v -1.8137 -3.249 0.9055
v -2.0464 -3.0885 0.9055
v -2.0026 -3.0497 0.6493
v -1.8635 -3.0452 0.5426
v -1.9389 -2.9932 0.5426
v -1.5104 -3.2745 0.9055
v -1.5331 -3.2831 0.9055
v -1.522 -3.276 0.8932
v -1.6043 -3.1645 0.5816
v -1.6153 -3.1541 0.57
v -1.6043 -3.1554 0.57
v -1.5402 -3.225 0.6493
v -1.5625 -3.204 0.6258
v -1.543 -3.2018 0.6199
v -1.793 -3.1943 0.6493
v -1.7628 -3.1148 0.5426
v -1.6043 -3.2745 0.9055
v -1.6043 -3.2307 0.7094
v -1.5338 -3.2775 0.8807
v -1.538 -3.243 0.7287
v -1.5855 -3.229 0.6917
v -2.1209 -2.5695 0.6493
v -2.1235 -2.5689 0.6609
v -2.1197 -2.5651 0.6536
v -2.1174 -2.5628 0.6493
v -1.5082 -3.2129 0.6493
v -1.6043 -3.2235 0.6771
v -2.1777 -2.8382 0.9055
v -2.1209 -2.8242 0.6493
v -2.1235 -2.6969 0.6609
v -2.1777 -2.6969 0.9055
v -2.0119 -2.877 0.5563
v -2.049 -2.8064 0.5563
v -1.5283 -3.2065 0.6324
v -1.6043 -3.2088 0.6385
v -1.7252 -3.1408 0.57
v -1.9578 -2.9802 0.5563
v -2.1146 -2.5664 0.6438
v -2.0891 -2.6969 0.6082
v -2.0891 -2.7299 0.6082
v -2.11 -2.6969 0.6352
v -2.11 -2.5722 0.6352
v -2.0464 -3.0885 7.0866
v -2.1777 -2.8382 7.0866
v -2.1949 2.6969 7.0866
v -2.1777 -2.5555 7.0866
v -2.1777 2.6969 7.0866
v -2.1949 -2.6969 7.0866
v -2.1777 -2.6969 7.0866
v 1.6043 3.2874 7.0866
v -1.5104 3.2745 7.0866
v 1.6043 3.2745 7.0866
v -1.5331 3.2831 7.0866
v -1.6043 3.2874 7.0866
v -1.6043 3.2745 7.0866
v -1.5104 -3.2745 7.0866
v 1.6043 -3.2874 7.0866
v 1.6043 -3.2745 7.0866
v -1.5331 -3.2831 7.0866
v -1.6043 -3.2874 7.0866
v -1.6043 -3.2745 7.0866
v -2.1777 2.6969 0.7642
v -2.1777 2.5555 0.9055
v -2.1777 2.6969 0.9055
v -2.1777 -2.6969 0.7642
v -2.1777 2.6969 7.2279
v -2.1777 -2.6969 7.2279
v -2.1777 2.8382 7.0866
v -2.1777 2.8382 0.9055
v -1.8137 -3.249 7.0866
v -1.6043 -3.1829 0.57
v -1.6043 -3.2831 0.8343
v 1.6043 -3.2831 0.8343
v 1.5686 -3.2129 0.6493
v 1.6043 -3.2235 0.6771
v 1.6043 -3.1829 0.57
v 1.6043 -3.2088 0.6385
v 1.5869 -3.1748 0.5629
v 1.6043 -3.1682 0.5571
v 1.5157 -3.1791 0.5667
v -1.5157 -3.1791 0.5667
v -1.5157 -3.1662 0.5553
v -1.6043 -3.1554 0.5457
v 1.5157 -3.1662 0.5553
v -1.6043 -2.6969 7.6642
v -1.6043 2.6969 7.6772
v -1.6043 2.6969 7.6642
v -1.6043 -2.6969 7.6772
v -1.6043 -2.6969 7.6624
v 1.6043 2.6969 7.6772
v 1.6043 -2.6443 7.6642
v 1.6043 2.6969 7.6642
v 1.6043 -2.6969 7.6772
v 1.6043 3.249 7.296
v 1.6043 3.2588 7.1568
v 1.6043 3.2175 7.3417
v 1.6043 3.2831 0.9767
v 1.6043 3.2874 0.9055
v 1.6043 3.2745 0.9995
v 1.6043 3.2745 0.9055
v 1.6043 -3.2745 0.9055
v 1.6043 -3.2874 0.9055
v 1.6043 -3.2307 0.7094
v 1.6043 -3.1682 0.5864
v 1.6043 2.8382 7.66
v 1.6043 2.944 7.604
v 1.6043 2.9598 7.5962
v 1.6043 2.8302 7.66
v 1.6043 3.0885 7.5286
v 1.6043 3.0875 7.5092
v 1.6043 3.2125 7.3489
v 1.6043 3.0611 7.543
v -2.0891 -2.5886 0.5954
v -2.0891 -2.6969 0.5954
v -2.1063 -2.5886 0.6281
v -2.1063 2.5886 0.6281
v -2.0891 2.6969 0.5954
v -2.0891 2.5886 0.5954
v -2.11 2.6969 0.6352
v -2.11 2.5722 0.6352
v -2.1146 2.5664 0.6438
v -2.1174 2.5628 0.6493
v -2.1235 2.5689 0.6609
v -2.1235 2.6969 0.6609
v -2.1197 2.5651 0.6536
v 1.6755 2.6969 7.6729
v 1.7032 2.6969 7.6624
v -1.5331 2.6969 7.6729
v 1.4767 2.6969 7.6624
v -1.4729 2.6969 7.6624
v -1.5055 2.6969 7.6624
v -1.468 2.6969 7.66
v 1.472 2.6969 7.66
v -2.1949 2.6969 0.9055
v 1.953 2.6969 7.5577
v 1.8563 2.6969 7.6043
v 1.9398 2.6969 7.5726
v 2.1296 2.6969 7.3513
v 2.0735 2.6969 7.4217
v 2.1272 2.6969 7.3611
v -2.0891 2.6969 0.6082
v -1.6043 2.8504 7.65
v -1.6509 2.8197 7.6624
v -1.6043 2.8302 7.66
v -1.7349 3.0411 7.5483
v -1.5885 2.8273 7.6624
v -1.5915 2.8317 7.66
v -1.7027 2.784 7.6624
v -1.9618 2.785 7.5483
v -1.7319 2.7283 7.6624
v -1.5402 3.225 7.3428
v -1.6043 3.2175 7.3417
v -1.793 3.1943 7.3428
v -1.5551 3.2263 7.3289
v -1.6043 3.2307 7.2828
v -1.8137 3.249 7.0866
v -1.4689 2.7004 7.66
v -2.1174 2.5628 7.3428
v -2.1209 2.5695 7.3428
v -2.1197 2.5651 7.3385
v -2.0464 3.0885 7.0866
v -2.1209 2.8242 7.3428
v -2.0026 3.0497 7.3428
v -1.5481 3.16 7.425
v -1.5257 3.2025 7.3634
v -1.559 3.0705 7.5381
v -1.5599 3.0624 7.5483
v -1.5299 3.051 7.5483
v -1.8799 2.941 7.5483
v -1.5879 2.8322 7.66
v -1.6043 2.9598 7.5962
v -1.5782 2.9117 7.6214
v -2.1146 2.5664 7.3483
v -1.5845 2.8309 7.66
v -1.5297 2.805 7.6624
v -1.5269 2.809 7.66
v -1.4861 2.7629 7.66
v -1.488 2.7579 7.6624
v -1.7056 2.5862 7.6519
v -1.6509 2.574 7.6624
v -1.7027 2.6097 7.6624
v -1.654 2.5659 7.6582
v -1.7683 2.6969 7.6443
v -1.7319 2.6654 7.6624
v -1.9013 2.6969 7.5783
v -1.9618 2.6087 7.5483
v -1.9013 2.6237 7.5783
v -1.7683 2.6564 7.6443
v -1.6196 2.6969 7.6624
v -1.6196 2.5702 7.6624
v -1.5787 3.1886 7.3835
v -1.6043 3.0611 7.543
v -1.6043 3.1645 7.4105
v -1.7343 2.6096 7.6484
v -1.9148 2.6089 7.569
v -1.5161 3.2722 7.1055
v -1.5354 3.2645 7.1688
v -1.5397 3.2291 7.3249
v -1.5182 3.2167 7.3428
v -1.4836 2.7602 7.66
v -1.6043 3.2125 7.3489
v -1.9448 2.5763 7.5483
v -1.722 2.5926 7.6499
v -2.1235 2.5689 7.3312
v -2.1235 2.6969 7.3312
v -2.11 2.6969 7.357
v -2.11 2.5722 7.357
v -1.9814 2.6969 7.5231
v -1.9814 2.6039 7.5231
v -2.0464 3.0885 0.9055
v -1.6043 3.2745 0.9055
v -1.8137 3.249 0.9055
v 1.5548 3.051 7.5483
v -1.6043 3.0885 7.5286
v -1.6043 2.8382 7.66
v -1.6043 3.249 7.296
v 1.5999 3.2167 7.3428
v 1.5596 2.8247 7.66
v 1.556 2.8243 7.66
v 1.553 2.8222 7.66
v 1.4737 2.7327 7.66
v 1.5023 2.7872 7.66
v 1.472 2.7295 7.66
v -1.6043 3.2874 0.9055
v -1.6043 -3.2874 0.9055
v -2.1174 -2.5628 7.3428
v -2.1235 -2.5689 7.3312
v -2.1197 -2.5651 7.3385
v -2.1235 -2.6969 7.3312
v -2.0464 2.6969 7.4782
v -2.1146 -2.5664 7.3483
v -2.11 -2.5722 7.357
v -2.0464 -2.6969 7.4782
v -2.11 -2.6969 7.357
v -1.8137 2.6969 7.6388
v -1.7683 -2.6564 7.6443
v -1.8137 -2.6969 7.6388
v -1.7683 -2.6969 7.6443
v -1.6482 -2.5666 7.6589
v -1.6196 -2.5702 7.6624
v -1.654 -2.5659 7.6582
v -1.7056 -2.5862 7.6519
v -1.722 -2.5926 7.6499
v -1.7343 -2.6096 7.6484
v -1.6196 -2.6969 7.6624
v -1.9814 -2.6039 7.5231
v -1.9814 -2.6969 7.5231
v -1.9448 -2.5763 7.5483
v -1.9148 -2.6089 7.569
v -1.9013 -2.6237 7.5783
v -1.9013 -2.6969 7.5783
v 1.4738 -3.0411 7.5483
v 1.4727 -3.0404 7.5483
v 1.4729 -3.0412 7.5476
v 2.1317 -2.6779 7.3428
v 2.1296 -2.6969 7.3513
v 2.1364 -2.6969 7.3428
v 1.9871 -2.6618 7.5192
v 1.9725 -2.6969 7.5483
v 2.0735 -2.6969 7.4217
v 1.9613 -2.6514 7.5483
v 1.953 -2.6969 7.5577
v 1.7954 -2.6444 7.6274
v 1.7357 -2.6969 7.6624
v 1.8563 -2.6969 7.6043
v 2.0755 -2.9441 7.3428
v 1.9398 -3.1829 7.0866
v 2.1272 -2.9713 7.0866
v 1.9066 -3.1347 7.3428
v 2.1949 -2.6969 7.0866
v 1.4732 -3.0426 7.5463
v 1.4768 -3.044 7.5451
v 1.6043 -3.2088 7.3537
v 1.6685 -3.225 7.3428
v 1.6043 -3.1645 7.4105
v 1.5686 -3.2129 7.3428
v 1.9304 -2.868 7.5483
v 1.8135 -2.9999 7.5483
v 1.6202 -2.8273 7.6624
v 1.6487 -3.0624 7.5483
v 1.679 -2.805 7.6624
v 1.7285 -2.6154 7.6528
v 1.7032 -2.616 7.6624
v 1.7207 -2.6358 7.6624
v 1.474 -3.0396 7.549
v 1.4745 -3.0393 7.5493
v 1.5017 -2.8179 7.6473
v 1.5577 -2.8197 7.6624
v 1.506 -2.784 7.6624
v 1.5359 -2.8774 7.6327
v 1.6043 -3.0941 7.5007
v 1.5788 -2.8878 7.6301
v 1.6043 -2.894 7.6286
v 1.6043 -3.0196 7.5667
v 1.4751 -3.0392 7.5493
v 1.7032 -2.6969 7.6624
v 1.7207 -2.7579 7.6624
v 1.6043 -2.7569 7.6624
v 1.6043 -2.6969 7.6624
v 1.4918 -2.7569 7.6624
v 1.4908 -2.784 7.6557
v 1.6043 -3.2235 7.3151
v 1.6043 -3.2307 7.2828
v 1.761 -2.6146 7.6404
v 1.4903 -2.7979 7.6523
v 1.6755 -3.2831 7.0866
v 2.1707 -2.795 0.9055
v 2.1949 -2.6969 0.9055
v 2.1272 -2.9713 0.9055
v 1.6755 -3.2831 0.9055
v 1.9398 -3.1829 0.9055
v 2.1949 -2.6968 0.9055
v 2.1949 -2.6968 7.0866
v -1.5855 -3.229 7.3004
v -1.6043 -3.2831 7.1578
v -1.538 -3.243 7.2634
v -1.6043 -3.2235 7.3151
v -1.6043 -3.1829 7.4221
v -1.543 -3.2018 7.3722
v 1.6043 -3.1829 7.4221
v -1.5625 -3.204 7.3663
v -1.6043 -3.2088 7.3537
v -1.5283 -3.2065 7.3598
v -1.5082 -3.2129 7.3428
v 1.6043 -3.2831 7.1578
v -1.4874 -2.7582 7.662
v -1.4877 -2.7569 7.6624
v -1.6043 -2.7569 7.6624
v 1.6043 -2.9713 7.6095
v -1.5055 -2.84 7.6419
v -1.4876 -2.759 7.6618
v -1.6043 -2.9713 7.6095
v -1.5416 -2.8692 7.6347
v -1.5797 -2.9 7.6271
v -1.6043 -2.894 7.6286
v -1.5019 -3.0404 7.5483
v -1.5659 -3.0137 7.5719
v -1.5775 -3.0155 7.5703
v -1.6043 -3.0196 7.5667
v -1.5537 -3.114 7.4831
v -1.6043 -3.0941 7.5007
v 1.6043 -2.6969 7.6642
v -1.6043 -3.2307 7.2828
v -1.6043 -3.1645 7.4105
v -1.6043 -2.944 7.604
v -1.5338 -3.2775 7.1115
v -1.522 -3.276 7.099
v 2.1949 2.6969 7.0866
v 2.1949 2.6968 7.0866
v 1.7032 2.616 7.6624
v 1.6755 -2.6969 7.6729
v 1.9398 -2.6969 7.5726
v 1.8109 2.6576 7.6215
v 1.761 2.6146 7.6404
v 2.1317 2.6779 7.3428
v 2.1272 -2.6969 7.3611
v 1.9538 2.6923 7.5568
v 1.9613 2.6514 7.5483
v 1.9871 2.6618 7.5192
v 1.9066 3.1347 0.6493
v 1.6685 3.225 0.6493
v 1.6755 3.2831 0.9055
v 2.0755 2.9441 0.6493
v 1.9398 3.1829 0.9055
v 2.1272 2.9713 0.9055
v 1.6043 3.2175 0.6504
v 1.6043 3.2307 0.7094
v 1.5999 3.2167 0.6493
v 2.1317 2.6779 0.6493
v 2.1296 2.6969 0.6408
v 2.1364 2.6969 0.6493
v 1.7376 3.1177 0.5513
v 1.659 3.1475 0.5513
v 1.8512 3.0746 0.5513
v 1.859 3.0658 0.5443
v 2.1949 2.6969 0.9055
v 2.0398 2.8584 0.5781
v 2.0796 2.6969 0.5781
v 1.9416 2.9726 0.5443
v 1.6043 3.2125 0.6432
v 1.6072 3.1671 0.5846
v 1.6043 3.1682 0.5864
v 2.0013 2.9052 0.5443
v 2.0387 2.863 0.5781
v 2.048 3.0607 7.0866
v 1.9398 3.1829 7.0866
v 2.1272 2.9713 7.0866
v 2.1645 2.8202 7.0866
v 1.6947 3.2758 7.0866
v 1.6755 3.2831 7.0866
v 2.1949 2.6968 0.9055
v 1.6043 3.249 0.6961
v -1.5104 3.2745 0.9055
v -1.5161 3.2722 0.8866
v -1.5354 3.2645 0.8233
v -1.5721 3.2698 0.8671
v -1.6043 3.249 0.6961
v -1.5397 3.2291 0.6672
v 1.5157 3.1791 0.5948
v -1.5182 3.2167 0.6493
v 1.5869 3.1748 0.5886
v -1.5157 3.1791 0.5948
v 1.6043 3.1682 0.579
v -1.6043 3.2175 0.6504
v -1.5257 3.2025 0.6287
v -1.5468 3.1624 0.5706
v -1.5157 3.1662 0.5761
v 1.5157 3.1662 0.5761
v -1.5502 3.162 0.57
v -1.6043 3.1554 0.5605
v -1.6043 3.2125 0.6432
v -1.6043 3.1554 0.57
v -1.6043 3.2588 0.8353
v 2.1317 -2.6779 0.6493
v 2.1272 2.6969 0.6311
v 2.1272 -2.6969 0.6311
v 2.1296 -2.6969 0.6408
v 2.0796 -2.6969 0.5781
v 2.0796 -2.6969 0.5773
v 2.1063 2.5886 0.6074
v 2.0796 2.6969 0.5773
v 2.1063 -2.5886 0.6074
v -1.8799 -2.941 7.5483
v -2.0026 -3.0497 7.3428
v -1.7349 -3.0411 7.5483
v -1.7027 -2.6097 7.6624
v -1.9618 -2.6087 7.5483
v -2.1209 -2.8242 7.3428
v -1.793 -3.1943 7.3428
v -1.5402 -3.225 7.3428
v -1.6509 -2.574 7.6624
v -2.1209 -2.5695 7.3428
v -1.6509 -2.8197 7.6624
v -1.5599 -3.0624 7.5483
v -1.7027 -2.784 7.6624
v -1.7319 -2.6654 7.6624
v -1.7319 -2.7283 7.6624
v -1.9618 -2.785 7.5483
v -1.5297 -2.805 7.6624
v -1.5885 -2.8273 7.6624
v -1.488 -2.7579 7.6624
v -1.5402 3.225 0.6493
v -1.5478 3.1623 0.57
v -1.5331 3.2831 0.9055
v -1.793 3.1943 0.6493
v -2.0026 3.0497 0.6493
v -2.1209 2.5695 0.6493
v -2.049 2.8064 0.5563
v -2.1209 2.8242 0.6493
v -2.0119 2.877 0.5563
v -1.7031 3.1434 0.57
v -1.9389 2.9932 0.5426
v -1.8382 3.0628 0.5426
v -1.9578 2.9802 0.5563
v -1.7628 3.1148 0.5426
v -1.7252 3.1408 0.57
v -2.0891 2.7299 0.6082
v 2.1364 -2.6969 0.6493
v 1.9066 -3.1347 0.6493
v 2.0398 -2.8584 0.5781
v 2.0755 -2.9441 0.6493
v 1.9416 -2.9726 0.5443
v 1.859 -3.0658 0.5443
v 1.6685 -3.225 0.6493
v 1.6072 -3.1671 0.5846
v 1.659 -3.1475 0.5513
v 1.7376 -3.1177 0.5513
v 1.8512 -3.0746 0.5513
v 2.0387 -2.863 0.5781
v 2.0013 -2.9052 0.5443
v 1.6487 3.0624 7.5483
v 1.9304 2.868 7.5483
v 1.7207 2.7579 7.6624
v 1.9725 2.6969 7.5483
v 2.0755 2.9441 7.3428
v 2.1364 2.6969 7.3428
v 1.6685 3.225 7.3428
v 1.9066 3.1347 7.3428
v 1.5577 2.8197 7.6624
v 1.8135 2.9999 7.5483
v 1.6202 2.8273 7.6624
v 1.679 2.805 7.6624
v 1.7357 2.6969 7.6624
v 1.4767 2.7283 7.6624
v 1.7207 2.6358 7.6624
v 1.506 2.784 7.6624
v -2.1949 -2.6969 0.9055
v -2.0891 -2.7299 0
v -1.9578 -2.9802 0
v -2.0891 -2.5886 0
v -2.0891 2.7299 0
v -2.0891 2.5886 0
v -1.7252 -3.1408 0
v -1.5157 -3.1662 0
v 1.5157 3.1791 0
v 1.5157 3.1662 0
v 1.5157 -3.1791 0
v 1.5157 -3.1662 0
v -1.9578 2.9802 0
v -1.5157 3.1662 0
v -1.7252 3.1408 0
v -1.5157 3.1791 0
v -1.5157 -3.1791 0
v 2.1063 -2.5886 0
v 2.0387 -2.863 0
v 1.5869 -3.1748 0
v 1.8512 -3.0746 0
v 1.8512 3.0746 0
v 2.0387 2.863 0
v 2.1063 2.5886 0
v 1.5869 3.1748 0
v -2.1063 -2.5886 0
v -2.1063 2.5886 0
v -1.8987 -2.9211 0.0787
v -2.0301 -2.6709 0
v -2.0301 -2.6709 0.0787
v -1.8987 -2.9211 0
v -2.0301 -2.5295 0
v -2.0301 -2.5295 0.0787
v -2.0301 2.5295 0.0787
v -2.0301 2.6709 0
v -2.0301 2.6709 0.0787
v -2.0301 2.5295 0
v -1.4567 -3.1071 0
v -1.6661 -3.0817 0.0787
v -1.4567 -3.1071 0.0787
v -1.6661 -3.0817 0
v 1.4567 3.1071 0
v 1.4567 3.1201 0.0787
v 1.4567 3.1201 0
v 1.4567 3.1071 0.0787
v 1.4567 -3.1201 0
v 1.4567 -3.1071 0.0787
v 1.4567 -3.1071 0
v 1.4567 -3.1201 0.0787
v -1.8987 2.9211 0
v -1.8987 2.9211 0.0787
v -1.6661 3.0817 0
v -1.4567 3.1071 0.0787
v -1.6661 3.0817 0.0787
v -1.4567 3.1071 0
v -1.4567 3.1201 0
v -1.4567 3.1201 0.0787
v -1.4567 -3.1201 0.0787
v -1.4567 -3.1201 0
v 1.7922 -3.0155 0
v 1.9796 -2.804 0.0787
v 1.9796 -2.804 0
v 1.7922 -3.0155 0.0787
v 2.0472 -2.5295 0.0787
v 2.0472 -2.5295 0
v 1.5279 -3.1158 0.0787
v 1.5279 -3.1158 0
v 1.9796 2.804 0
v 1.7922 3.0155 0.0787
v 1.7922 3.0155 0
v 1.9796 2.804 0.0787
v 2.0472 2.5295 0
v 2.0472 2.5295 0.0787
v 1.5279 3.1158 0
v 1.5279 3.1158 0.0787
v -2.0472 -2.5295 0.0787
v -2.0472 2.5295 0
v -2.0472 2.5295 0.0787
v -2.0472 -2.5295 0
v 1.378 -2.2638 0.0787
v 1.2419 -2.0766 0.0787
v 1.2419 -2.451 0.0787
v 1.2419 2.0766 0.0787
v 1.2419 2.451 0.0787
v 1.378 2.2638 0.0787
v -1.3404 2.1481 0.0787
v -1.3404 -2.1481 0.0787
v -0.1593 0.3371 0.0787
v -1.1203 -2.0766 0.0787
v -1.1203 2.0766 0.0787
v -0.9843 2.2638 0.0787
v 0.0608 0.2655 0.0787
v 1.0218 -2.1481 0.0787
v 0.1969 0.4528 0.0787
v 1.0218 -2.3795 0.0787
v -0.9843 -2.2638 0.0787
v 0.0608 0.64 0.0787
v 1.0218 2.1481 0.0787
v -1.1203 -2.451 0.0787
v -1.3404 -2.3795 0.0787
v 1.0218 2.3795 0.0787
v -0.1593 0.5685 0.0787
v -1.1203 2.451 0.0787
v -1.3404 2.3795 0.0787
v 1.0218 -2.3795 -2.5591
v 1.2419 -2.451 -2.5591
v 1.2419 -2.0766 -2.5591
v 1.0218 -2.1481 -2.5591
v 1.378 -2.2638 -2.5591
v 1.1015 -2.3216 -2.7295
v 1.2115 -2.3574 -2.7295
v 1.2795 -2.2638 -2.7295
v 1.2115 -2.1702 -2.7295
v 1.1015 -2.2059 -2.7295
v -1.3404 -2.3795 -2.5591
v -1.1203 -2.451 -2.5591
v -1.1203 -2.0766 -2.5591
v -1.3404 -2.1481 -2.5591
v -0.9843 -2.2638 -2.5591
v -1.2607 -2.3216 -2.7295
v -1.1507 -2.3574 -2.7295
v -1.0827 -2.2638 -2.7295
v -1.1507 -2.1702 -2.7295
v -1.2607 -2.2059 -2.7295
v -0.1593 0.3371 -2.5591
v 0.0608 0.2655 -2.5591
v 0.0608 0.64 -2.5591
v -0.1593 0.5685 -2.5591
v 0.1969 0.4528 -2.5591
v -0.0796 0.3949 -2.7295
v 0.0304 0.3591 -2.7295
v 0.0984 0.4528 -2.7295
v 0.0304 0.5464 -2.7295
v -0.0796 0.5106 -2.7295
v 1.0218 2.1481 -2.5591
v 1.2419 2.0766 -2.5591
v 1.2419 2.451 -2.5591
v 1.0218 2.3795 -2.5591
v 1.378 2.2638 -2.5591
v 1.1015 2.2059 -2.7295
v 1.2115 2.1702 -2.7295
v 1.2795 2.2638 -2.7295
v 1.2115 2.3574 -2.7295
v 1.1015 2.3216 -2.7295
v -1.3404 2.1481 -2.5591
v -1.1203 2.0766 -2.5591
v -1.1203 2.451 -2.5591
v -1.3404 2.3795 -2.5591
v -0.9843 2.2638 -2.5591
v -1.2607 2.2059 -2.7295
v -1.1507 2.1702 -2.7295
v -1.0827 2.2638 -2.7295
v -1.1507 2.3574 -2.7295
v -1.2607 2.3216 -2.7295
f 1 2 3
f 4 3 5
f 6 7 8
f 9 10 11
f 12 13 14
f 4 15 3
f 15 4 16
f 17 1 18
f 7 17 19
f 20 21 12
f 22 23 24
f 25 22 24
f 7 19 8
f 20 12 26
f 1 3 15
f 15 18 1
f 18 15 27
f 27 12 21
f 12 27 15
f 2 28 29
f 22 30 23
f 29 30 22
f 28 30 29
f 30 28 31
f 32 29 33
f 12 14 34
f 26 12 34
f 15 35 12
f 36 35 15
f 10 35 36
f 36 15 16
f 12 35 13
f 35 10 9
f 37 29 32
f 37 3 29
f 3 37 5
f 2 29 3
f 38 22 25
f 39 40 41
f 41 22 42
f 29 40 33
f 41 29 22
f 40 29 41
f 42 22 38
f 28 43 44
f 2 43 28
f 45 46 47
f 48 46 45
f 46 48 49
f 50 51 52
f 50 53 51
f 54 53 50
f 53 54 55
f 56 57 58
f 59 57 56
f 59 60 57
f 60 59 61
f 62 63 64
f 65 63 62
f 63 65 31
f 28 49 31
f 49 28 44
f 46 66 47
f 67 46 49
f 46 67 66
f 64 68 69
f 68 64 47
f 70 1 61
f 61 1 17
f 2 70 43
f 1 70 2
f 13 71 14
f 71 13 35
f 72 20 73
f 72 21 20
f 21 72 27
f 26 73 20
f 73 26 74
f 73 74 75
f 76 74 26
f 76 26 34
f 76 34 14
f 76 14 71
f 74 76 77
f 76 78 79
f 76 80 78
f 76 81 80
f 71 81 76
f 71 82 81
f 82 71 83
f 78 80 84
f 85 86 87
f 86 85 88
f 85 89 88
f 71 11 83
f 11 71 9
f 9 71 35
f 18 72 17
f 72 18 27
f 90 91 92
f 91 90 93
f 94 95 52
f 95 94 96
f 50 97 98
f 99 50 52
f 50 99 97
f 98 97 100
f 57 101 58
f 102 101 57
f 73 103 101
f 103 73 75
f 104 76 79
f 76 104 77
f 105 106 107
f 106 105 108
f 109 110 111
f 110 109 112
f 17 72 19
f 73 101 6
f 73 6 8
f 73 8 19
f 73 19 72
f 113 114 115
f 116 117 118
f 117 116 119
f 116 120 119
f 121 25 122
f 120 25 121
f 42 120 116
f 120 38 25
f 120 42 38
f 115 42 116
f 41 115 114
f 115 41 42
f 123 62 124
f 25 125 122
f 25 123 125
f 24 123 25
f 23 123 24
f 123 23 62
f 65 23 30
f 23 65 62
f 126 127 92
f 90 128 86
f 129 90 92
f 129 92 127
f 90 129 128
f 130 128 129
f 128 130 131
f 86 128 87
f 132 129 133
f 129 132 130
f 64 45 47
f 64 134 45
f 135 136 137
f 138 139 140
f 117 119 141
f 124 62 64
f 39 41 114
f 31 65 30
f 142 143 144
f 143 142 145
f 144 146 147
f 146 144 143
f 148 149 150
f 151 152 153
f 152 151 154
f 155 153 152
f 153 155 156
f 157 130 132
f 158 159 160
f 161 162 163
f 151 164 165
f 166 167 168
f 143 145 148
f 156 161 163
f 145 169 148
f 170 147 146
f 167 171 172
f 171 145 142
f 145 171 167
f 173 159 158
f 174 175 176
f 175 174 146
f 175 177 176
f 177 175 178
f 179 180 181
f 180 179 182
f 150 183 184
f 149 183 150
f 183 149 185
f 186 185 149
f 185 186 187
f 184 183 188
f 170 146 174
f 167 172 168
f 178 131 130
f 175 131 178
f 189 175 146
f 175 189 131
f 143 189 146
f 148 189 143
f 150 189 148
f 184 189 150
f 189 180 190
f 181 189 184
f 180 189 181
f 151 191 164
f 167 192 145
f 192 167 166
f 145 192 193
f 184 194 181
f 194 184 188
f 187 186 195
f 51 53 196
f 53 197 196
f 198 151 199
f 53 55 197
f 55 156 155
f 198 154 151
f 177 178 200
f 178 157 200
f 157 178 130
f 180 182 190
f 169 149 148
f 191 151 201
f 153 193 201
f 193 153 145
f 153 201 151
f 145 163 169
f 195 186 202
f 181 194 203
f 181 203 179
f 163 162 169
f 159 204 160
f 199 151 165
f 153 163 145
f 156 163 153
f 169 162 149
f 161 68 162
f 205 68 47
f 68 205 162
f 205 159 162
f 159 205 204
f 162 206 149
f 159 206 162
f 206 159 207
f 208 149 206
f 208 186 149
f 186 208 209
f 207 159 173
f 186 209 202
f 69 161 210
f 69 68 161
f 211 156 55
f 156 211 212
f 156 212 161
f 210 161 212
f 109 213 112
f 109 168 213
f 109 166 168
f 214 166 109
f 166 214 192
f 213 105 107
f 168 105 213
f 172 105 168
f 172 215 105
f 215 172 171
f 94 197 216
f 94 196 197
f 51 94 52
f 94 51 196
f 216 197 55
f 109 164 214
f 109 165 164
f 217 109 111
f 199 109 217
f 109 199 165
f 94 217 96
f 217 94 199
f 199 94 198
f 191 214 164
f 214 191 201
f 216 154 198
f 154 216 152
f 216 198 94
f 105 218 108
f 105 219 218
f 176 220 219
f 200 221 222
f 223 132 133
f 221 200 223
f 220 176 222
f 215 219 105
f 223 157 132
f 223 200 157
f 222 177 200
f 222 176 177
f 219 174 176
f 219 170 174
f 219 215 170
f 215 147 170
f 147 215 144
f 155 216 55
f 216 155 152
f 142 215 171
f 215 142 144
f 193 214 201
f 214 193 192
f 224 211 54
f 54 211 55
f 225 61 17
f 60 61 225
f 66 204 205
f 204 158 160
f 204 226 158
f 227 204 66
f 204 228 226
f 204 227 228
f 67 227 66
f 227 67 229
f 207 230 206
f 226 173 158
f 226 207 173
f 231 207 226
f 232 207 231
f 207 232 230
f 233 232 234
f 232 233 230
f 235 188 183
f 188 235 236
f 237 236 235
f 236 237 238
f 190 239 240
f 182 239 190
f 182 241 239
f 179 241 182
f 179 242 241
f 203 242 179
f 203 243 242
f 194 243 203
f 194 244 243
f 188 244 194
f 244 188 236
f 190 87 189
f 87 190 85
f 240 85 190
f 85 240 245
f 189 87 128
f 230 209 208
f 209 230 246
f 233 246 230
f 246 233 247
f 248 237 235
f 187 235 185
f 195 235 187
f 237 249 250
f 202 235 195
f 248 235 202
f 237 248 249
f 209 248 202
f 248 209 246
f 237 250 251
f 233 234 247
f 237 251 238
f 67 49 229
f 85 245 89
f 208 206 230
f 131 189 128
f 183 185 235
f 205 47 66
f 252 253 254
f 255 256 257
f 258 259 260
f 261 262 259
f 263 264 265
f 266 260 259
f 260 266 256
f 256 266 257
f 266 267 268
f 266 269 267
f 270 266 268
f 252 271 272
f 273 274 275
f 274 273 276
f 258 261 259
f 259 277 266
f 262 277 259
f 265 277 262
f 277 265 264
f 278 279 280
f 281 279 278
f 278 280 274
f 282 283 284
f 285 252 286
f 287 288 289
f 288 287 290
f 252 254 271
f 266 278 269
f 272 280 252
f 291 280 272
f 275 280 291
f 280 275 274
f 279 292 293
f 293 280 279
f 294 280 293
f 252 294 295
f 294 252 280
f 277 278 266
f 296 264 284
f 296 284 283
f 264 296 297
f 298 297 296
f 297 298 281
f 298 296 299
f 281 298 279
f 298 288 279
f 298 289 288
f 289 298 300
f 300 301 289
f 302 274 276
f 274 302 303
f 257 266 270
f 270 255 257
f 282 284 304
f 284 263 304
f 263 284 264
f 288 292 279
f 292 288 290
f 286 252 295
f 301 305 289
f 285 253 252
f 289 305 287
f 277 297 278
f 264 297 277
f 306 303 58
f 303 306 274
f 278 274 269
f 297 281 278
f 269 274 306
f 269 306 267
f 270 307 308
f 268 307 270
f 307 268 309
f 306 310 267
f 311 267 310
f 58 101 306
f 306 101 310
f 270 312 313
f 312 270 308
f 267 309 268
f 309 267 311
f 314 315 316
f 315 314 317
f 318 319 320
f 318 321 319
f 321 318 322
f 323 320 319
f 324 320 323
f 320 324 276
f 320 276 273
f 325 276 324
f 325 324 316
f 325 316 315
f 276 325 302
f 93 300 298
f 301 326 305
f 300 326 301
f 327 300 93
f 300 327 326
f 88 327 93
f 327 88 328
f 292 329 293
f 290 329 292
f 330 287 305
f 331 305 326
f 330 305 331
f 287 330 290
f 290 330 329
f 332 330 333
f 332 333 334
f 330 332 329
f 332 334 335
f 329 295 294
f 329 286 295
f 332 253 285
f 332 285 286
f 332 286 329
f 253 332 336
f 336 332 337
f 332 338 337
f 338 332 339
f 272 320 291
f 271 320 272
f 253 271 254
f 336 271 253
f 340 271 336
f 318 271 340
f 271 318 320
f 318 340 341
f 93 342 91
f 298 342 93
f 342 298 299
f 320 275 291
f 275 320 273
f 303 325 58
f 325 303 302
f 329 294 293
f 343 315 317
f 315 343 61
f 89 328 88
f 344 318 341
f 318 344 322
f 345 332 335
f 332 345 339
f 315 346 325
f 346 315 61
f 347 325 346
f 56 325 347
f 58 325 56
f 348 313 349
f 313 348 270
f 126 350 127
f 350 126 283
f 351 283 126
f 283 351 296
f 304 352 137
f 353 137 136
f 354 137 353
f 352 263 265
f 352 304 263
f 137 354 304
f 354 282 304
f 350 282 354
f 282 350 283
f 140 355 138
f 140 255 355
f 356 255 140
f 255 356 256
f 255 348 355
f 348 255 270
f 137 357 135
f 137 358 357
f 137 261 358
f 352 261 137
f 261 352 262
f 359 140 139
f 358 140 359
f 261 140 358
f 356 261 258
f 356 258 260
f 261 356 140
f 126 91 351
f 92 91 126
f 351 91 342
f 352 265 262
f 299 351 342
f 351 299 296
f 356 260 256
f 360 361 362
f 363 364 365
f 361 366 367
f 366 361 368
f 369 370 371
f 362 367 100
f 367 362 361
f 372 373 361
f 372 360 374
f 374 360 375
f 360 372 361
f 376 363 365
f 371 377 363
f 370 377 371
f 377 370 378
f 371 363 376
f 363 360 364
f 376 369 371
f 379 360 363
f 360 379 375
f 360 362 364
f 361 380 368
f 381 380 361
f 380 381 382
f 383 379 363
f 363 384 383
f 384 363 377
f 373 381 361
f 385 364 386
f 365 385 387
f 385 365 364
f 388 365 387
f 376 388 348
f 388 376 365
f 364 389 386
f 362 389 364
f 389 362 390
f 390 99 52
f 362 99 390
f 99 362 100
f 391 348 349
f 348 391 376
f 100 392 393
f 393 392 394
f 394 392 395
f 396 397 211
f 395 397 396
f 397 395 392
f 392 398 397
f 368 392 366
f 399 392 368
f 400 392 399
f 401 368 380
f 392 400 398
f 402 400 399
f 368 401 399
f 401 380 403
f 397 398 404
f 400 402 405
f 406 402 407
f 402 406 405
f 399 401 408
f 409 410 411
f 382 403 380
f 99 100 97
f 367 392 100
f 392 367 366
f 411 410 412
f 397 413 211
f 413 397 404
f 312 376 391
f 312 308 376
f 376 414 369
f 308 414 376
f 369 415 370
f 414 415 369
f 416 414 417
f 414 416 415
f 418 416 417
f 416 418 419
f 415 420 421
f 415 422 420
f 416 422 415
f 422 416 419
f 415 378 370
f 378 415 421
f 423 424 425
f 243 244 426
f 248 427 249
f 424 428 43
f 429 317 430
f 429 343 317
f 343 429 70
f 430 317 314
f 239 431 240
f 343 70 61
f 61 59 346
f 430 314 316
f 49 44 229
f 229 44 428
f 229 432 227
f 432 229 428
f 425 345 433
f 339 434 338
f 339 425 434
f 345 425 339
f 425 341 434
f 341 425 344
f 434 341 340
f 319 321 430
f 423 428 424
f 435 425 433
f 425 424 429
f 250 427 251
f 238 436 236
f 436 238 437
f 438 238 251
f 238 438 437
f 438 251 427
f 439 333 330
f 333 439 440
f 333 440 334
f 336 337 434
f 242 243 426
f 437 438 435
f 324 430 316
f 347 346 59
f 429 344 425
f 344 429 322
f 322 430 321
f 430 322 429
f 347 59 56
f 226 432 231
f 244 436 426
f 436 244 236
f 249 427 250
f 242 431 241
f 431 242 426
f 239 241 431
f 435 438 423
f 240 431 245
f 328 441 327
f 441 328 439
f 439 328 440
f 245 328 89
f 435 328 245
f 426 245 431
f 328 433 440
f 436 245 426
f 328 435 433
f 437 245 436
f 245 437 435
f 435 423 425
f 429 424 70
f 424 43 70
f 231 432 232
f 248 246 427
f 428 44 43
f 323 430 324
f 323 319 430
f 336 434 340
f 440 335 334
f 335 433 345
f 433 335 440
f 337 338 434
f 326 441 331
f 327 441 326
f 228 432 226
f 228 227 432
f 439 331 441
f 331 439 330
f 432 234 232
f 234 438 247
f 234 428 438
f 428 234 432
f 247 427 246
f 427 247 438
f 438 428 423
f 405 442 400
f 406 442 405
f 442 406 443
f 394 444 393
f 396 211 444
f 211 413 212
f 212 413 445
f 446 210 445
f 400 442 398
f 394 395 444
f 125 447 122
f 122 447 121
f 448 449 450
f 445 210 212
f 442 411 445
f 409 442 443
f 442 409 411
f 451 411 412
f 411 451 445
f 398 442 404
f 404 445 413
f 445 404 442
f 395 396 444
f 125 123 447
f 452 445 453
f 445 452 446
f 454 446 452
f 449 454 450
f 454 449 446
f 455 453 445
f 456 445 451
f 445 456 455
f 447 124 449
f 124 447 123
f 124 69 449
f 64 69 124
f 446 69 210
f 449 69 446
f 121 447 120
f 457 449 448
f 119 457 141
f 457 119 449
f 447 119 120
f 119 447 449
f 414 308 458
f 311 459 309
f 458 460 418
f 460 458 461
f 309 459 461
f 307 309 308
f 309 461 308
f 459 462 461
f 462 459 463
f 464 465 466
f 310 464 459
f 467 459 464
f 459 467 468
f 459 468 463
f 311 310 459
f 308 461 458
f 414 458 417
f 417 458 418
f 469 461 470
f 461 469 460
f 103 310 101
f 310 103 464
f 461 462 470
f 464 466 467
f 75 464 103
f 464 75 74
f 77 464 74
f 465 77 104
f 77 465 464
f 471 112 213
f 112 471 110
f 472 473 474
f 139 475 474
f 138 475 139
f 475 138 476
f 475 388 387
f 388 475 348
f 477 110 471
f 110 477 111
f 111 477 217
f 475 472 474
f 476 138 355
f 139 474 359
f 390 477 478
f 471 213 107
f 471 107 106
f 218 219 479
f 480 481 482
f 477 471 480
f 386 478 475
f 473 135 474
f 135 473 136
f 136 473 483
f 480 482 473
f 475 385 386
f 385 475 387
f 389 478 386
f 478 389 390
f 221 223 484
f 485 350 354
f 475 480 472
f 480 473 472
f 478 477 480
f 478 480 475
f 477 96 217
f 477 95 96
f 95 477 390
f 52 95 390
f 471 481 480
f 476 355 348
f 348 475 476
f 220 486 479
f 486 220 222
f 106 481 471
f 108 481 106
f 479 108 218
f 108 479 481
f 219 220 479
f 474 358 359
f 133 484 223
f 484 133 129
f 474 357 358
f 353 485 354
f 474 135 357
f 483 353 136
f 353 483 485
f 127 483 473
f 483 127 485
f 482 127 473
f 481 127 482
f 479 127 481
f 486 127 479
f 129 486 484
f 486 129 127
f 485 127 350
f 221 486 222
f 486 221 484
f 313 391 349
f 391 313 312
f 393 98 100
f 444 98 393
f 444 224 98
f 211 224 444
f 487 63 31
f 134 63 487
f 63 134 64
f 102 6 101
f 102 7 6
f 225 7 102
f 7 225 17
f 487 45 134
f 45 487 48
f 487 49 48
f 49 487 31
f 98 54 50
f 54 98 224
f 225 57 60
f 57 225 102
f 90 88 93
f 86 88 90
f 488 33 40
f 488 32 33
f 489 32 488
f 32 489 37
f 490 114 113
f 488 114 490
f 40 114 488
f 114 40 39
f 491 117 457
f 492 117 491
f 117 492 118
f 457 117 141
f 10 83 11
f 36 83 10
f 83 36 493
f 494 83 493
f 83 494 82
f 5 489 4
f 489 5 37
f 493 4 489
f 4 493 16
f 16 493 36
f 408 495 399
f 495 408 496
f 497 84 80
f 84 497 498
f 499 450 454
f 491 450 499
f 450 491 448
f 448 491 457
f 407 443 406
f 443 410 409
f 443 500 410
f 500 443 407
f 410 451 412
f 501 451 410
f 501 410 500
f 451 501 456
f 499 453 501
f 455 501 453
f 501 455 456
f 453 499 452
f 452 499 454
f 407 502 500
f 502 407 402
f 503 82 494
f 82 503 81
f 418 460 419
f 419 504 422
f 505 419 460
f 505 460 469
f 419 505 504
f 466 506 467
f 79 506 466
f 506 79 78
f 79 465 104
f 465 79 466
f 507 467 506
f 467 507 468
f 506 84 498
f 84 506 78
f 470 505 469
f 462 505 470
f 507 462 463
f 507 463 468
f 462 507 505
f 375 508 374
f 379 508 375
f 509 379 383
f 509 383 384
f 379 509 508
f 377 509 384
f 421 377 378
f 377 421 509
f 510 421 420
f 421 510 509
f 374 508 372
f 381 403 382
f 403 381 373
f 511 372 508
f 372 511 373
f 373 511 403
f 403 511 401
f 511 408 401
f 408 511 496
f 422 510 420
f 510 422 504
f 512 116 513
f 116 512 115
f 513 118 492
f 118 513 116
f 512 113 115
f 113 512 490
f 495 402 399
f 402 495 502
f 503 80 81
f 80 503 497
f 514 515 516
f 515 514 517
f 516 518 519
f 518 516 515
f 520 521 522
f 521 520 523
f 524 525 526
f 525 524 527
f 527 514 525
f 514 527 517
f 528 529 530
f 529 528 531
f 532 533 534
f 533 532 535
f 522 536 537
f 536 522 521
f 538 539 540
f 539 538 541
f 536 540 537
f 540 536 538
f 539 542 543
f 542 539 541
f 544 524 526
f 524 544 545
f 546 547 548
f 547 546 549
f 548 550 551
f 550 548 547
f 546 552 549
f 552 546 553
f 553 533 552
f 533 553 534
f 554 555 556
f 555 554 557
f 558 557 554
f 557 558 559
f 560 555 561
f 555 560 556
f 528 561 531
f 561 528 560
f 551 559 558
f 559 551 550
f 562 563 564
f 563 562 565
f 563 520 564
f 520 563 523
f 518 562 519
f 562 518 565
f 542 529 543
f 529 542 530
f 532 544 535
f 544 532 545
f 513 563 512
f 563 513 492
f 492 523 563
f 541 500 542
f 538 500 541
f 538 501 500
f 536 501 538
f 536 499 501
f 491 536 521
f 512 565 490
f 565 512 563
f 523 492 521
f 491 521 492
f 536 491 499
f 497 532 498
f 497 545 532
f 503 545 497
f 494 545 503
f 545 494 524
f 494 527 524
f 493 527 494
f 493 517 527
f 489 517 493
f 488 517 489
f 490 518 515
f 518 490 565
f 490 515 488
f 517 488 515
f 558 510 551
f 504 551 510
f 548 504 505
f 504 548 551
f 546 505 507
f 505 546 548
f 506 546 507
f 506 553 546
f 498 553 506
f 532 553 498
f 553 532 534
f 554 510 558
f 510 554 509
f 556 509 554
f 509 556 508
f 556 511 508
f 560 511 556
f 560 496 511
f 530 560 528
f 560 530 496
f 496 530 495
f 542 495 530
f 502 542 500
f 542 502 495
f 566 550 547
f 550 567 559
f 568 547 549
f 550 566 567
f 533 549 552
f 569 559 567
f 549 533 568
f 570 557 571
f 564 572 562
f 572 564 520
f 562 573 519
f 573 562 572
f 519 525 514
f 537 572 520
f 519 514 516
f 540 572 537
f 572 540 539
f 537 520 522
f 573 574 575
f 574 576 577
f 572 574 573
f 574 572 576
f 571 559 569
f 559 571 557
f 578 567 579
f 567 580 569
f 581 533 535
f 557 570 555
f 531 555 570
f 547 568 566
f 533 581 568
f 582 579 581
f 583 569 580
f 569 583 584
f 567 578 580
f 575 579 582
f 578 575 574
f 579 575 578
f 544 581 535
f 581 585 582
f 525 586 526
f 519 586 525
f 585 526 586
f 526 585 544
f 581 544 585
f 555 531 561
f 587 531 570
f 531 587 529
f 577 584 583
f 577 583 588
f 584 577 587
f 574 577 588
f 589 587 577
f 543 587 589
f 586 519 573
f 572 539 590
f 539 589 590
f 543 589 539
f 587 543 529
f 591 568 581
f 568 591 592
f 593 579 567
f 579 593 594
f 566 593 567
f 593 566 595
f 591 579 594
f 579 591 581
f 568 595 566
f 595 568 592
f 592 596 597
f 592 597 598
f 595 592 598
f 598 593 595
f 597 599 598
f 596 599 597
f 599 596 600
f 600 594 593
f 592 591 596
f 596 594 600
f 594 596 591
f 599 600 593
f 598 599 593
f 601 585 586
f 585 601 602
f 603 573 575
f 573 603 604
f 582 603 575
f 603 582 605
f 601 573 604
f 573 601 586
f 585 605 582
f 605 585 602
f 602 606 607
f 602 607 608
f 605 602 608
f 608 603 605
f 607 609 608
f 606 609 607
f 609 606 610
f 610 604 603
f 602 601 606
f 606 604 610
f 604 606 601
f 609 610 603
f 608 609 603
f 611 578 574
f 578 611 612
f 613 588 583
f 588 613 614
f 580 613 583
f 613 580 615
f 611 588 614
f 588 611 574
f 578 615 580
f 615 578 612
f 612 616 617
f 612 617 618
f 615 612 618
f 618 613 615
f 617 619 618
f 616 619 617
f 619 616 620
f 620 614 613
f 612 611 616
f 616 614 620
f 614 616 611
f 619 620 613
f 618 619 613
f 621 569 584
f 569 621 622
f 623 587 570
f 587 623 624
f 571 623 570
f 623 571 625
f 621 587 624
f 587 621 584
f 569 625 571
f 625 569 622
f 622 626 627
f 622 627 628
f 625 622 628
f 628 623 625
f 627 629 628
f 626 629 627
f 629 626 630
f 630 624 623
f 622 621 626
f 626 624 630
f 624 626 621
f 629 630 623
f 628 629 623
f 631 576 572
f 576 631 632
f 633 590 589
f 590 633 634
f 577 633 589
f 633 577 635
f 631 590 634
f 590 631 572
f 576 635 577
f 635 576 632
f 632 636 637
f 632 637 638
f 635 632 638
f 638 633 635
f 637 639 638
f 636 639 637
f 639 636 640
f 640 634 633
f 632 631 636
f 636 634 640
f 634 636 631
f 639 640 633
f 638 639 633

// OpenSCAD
//$fs = 0.1;
underground = 2;

module rounded_cube(x, y, z, r) {
	$fs = r/2;
	d = r*2;
	union() {
		// рёбра
		translate([r, r, r]) {
			sphere(d = d);
			cylinder(h = z-d, d = d);
			rotate([0, 90, 0])
			cylinder(h = x-d, d = d);
			rotate([-90, 0, 0])
			cylinder(h = y-d, d = d);
		}
		translate([r, y-r, z-r]) {
			sphere(d = d);
			rotate([180, 0, 0])
			cylinder(h = z-d, d = d);
			rotate([0, 90, 0])
			cylinder(h = x-d, d = d);
			rotate([90, 0, 0])
			cylinder(h = y-d, d = d);
		}
		translate([x-r, r, z-r]) {
			sphere(d = d);
			rotate([180, 0, 0])
			cylinder(h = z-d, d = d);
			rotate([0, -90, 0])
			cylinder(h = x-d, d = d);
			rotate([-90, 0, 0])
			cylinder(h = y-d, d = d);
		}
		translate([x-r, y-r, r]) {
			sphere(d = d);
			cylinder(h = z-d, d = d);
			rotate([0, -90, 0])
			cylinder(h = x-d, d = d);
			rotate([90, 0, 0])
			cylinder(h = y-d, d = d);
		}
		// недостающие углы
		translate([r, r, z-r]) sphere(d=d);
		translate([r, y-r, r]) sphere(d=d);
		translate([x-r, r, r]) sphere(d=d);
		translate([x-r, y-r, z-r]) sphere(d=d);
		// грани
		translate([0, r, r]) cube([x, y-d, z-d]);
		translate([r, 0, r]) cube([x-d, y, z-d]);
		translate([r, r, 0]) cube([x-d, y-d, z]);
	}
}

module pin(l, w, h) {
	$fs = 0.1;
	color("silver")
	translate([0, 0, -h/2 + l/4])
	union() {
		cube([l, w, h - l/2], center = true);
		translate([0, w/2, -h/2 + l/4])
		rotate([90, 0, 0])
		cylinder(d = l, h = w);
	}
	//cylinder(d = d, h = l);
}

module cyl_pin(l, d) {
	color("silver")
	union() {
		translate([0, 0, -l+d/2])
		cylinder(h = l-d/2, d = d);
		translate([0, 0, -l+d/2])
		sphere(d = d);
	}
}

module relay(l, w, h, pin_l, pin_w, pin_h, s1, s2, s3, s4) {
	_inch = 1/2.54;
	depth = diameter * 0.6;
	scale([_inch, _inch, _inch]) {
		color([0.1, 0.1, 0.1])
		translate([-w/2, -l/2, 0])
		cube([w, l, h]);
		// pins
		translate([0, -l/2, 0]) {
			// central pin
			translate([0, s1, 0])
			pin(l = pin_l, w = pin_w, h = pin_h);
			// coil
			translate([s4/2, s1 + s2, 0])
			pin(l = pin_l, w = pin_w, h = pin_h);
			translate([-s4/2, s1 + s2, 0])
			pin(l = pin_l, w = pin_w, h = pin_h);
			// contacts
			translate([s4/2, s1 + s2 + s3, 0])
			pin(l = pin_l, w = pin_w, h = pin_h);
			translate([-s4/2, s1 + s2 + s3, 0])
			pin(l = pin_l, w = pin_w, h = pin_h);
		}
	}
}

module PEC10() {
	_inch = 1/2.54;
	sx = 11.15; sy = 16.7; sz = 19.5;
	smx = 10.7; smy = 16.15; smz = 0.8;
	w = 0.3;
	pin_l = 7; pin_d = 1;
	scale([_inch, _inch, _inch]) {
		union () {
			translate([-sx/2, -sy/2, 0]) {
				translate([0, 0, smz])
				color("silver") rounded_cube(sx, sy, sz - smz, 1.5);
				color("silver") difference() {
					translate([(sx-smx)/2, (sy-smy)/2, -5])
					rounded_cube(smx, smy, 10, 1.5);
					translate([(sx-smx+w)/2, (sy-smy+w)/2, -5])
					rounded_cube(smx-w, smy-w, 10, 1.5);
					translate([0, 0, -10]) cube([sx, sy, 10]);
				}
				color([0.3, 0.2, 0.1]) difference() {
					translate([(sx-smx+w)/2, (sy-smy+w)/2, -5])
					rounded_cube(smx-w, smy-w, 10, 1.5);
					translate([0, 0, -9.8]) cube([sx, sy, 10]);
				}
			}
			translate([3, -5.75, 1]) cyl_pin(pin_l+1, pin_d);
			translate([-3, -5.75, 1]) cyl_pin(pin_l+1, pin_d);
			translate([0, 1.15, 1]) cyl_pin(pin_l+1, pin_d);
			translate([3, 5.75, 1]) cyl_pin(pin_l+1, pin_d);
			translate([-3, 5.75, 1]) cyl_pin(pin_l+1, pin_d);
		}
		
	}
}

// JZC-20F
//relay(l = 22.5, w = 16.5, h = 24, pin_h = 5, pin_l = 1, pin_w = 0.4, s1 = 2, s2 = 2, s3 = 12.2, s4 = 12);
PEC10();
